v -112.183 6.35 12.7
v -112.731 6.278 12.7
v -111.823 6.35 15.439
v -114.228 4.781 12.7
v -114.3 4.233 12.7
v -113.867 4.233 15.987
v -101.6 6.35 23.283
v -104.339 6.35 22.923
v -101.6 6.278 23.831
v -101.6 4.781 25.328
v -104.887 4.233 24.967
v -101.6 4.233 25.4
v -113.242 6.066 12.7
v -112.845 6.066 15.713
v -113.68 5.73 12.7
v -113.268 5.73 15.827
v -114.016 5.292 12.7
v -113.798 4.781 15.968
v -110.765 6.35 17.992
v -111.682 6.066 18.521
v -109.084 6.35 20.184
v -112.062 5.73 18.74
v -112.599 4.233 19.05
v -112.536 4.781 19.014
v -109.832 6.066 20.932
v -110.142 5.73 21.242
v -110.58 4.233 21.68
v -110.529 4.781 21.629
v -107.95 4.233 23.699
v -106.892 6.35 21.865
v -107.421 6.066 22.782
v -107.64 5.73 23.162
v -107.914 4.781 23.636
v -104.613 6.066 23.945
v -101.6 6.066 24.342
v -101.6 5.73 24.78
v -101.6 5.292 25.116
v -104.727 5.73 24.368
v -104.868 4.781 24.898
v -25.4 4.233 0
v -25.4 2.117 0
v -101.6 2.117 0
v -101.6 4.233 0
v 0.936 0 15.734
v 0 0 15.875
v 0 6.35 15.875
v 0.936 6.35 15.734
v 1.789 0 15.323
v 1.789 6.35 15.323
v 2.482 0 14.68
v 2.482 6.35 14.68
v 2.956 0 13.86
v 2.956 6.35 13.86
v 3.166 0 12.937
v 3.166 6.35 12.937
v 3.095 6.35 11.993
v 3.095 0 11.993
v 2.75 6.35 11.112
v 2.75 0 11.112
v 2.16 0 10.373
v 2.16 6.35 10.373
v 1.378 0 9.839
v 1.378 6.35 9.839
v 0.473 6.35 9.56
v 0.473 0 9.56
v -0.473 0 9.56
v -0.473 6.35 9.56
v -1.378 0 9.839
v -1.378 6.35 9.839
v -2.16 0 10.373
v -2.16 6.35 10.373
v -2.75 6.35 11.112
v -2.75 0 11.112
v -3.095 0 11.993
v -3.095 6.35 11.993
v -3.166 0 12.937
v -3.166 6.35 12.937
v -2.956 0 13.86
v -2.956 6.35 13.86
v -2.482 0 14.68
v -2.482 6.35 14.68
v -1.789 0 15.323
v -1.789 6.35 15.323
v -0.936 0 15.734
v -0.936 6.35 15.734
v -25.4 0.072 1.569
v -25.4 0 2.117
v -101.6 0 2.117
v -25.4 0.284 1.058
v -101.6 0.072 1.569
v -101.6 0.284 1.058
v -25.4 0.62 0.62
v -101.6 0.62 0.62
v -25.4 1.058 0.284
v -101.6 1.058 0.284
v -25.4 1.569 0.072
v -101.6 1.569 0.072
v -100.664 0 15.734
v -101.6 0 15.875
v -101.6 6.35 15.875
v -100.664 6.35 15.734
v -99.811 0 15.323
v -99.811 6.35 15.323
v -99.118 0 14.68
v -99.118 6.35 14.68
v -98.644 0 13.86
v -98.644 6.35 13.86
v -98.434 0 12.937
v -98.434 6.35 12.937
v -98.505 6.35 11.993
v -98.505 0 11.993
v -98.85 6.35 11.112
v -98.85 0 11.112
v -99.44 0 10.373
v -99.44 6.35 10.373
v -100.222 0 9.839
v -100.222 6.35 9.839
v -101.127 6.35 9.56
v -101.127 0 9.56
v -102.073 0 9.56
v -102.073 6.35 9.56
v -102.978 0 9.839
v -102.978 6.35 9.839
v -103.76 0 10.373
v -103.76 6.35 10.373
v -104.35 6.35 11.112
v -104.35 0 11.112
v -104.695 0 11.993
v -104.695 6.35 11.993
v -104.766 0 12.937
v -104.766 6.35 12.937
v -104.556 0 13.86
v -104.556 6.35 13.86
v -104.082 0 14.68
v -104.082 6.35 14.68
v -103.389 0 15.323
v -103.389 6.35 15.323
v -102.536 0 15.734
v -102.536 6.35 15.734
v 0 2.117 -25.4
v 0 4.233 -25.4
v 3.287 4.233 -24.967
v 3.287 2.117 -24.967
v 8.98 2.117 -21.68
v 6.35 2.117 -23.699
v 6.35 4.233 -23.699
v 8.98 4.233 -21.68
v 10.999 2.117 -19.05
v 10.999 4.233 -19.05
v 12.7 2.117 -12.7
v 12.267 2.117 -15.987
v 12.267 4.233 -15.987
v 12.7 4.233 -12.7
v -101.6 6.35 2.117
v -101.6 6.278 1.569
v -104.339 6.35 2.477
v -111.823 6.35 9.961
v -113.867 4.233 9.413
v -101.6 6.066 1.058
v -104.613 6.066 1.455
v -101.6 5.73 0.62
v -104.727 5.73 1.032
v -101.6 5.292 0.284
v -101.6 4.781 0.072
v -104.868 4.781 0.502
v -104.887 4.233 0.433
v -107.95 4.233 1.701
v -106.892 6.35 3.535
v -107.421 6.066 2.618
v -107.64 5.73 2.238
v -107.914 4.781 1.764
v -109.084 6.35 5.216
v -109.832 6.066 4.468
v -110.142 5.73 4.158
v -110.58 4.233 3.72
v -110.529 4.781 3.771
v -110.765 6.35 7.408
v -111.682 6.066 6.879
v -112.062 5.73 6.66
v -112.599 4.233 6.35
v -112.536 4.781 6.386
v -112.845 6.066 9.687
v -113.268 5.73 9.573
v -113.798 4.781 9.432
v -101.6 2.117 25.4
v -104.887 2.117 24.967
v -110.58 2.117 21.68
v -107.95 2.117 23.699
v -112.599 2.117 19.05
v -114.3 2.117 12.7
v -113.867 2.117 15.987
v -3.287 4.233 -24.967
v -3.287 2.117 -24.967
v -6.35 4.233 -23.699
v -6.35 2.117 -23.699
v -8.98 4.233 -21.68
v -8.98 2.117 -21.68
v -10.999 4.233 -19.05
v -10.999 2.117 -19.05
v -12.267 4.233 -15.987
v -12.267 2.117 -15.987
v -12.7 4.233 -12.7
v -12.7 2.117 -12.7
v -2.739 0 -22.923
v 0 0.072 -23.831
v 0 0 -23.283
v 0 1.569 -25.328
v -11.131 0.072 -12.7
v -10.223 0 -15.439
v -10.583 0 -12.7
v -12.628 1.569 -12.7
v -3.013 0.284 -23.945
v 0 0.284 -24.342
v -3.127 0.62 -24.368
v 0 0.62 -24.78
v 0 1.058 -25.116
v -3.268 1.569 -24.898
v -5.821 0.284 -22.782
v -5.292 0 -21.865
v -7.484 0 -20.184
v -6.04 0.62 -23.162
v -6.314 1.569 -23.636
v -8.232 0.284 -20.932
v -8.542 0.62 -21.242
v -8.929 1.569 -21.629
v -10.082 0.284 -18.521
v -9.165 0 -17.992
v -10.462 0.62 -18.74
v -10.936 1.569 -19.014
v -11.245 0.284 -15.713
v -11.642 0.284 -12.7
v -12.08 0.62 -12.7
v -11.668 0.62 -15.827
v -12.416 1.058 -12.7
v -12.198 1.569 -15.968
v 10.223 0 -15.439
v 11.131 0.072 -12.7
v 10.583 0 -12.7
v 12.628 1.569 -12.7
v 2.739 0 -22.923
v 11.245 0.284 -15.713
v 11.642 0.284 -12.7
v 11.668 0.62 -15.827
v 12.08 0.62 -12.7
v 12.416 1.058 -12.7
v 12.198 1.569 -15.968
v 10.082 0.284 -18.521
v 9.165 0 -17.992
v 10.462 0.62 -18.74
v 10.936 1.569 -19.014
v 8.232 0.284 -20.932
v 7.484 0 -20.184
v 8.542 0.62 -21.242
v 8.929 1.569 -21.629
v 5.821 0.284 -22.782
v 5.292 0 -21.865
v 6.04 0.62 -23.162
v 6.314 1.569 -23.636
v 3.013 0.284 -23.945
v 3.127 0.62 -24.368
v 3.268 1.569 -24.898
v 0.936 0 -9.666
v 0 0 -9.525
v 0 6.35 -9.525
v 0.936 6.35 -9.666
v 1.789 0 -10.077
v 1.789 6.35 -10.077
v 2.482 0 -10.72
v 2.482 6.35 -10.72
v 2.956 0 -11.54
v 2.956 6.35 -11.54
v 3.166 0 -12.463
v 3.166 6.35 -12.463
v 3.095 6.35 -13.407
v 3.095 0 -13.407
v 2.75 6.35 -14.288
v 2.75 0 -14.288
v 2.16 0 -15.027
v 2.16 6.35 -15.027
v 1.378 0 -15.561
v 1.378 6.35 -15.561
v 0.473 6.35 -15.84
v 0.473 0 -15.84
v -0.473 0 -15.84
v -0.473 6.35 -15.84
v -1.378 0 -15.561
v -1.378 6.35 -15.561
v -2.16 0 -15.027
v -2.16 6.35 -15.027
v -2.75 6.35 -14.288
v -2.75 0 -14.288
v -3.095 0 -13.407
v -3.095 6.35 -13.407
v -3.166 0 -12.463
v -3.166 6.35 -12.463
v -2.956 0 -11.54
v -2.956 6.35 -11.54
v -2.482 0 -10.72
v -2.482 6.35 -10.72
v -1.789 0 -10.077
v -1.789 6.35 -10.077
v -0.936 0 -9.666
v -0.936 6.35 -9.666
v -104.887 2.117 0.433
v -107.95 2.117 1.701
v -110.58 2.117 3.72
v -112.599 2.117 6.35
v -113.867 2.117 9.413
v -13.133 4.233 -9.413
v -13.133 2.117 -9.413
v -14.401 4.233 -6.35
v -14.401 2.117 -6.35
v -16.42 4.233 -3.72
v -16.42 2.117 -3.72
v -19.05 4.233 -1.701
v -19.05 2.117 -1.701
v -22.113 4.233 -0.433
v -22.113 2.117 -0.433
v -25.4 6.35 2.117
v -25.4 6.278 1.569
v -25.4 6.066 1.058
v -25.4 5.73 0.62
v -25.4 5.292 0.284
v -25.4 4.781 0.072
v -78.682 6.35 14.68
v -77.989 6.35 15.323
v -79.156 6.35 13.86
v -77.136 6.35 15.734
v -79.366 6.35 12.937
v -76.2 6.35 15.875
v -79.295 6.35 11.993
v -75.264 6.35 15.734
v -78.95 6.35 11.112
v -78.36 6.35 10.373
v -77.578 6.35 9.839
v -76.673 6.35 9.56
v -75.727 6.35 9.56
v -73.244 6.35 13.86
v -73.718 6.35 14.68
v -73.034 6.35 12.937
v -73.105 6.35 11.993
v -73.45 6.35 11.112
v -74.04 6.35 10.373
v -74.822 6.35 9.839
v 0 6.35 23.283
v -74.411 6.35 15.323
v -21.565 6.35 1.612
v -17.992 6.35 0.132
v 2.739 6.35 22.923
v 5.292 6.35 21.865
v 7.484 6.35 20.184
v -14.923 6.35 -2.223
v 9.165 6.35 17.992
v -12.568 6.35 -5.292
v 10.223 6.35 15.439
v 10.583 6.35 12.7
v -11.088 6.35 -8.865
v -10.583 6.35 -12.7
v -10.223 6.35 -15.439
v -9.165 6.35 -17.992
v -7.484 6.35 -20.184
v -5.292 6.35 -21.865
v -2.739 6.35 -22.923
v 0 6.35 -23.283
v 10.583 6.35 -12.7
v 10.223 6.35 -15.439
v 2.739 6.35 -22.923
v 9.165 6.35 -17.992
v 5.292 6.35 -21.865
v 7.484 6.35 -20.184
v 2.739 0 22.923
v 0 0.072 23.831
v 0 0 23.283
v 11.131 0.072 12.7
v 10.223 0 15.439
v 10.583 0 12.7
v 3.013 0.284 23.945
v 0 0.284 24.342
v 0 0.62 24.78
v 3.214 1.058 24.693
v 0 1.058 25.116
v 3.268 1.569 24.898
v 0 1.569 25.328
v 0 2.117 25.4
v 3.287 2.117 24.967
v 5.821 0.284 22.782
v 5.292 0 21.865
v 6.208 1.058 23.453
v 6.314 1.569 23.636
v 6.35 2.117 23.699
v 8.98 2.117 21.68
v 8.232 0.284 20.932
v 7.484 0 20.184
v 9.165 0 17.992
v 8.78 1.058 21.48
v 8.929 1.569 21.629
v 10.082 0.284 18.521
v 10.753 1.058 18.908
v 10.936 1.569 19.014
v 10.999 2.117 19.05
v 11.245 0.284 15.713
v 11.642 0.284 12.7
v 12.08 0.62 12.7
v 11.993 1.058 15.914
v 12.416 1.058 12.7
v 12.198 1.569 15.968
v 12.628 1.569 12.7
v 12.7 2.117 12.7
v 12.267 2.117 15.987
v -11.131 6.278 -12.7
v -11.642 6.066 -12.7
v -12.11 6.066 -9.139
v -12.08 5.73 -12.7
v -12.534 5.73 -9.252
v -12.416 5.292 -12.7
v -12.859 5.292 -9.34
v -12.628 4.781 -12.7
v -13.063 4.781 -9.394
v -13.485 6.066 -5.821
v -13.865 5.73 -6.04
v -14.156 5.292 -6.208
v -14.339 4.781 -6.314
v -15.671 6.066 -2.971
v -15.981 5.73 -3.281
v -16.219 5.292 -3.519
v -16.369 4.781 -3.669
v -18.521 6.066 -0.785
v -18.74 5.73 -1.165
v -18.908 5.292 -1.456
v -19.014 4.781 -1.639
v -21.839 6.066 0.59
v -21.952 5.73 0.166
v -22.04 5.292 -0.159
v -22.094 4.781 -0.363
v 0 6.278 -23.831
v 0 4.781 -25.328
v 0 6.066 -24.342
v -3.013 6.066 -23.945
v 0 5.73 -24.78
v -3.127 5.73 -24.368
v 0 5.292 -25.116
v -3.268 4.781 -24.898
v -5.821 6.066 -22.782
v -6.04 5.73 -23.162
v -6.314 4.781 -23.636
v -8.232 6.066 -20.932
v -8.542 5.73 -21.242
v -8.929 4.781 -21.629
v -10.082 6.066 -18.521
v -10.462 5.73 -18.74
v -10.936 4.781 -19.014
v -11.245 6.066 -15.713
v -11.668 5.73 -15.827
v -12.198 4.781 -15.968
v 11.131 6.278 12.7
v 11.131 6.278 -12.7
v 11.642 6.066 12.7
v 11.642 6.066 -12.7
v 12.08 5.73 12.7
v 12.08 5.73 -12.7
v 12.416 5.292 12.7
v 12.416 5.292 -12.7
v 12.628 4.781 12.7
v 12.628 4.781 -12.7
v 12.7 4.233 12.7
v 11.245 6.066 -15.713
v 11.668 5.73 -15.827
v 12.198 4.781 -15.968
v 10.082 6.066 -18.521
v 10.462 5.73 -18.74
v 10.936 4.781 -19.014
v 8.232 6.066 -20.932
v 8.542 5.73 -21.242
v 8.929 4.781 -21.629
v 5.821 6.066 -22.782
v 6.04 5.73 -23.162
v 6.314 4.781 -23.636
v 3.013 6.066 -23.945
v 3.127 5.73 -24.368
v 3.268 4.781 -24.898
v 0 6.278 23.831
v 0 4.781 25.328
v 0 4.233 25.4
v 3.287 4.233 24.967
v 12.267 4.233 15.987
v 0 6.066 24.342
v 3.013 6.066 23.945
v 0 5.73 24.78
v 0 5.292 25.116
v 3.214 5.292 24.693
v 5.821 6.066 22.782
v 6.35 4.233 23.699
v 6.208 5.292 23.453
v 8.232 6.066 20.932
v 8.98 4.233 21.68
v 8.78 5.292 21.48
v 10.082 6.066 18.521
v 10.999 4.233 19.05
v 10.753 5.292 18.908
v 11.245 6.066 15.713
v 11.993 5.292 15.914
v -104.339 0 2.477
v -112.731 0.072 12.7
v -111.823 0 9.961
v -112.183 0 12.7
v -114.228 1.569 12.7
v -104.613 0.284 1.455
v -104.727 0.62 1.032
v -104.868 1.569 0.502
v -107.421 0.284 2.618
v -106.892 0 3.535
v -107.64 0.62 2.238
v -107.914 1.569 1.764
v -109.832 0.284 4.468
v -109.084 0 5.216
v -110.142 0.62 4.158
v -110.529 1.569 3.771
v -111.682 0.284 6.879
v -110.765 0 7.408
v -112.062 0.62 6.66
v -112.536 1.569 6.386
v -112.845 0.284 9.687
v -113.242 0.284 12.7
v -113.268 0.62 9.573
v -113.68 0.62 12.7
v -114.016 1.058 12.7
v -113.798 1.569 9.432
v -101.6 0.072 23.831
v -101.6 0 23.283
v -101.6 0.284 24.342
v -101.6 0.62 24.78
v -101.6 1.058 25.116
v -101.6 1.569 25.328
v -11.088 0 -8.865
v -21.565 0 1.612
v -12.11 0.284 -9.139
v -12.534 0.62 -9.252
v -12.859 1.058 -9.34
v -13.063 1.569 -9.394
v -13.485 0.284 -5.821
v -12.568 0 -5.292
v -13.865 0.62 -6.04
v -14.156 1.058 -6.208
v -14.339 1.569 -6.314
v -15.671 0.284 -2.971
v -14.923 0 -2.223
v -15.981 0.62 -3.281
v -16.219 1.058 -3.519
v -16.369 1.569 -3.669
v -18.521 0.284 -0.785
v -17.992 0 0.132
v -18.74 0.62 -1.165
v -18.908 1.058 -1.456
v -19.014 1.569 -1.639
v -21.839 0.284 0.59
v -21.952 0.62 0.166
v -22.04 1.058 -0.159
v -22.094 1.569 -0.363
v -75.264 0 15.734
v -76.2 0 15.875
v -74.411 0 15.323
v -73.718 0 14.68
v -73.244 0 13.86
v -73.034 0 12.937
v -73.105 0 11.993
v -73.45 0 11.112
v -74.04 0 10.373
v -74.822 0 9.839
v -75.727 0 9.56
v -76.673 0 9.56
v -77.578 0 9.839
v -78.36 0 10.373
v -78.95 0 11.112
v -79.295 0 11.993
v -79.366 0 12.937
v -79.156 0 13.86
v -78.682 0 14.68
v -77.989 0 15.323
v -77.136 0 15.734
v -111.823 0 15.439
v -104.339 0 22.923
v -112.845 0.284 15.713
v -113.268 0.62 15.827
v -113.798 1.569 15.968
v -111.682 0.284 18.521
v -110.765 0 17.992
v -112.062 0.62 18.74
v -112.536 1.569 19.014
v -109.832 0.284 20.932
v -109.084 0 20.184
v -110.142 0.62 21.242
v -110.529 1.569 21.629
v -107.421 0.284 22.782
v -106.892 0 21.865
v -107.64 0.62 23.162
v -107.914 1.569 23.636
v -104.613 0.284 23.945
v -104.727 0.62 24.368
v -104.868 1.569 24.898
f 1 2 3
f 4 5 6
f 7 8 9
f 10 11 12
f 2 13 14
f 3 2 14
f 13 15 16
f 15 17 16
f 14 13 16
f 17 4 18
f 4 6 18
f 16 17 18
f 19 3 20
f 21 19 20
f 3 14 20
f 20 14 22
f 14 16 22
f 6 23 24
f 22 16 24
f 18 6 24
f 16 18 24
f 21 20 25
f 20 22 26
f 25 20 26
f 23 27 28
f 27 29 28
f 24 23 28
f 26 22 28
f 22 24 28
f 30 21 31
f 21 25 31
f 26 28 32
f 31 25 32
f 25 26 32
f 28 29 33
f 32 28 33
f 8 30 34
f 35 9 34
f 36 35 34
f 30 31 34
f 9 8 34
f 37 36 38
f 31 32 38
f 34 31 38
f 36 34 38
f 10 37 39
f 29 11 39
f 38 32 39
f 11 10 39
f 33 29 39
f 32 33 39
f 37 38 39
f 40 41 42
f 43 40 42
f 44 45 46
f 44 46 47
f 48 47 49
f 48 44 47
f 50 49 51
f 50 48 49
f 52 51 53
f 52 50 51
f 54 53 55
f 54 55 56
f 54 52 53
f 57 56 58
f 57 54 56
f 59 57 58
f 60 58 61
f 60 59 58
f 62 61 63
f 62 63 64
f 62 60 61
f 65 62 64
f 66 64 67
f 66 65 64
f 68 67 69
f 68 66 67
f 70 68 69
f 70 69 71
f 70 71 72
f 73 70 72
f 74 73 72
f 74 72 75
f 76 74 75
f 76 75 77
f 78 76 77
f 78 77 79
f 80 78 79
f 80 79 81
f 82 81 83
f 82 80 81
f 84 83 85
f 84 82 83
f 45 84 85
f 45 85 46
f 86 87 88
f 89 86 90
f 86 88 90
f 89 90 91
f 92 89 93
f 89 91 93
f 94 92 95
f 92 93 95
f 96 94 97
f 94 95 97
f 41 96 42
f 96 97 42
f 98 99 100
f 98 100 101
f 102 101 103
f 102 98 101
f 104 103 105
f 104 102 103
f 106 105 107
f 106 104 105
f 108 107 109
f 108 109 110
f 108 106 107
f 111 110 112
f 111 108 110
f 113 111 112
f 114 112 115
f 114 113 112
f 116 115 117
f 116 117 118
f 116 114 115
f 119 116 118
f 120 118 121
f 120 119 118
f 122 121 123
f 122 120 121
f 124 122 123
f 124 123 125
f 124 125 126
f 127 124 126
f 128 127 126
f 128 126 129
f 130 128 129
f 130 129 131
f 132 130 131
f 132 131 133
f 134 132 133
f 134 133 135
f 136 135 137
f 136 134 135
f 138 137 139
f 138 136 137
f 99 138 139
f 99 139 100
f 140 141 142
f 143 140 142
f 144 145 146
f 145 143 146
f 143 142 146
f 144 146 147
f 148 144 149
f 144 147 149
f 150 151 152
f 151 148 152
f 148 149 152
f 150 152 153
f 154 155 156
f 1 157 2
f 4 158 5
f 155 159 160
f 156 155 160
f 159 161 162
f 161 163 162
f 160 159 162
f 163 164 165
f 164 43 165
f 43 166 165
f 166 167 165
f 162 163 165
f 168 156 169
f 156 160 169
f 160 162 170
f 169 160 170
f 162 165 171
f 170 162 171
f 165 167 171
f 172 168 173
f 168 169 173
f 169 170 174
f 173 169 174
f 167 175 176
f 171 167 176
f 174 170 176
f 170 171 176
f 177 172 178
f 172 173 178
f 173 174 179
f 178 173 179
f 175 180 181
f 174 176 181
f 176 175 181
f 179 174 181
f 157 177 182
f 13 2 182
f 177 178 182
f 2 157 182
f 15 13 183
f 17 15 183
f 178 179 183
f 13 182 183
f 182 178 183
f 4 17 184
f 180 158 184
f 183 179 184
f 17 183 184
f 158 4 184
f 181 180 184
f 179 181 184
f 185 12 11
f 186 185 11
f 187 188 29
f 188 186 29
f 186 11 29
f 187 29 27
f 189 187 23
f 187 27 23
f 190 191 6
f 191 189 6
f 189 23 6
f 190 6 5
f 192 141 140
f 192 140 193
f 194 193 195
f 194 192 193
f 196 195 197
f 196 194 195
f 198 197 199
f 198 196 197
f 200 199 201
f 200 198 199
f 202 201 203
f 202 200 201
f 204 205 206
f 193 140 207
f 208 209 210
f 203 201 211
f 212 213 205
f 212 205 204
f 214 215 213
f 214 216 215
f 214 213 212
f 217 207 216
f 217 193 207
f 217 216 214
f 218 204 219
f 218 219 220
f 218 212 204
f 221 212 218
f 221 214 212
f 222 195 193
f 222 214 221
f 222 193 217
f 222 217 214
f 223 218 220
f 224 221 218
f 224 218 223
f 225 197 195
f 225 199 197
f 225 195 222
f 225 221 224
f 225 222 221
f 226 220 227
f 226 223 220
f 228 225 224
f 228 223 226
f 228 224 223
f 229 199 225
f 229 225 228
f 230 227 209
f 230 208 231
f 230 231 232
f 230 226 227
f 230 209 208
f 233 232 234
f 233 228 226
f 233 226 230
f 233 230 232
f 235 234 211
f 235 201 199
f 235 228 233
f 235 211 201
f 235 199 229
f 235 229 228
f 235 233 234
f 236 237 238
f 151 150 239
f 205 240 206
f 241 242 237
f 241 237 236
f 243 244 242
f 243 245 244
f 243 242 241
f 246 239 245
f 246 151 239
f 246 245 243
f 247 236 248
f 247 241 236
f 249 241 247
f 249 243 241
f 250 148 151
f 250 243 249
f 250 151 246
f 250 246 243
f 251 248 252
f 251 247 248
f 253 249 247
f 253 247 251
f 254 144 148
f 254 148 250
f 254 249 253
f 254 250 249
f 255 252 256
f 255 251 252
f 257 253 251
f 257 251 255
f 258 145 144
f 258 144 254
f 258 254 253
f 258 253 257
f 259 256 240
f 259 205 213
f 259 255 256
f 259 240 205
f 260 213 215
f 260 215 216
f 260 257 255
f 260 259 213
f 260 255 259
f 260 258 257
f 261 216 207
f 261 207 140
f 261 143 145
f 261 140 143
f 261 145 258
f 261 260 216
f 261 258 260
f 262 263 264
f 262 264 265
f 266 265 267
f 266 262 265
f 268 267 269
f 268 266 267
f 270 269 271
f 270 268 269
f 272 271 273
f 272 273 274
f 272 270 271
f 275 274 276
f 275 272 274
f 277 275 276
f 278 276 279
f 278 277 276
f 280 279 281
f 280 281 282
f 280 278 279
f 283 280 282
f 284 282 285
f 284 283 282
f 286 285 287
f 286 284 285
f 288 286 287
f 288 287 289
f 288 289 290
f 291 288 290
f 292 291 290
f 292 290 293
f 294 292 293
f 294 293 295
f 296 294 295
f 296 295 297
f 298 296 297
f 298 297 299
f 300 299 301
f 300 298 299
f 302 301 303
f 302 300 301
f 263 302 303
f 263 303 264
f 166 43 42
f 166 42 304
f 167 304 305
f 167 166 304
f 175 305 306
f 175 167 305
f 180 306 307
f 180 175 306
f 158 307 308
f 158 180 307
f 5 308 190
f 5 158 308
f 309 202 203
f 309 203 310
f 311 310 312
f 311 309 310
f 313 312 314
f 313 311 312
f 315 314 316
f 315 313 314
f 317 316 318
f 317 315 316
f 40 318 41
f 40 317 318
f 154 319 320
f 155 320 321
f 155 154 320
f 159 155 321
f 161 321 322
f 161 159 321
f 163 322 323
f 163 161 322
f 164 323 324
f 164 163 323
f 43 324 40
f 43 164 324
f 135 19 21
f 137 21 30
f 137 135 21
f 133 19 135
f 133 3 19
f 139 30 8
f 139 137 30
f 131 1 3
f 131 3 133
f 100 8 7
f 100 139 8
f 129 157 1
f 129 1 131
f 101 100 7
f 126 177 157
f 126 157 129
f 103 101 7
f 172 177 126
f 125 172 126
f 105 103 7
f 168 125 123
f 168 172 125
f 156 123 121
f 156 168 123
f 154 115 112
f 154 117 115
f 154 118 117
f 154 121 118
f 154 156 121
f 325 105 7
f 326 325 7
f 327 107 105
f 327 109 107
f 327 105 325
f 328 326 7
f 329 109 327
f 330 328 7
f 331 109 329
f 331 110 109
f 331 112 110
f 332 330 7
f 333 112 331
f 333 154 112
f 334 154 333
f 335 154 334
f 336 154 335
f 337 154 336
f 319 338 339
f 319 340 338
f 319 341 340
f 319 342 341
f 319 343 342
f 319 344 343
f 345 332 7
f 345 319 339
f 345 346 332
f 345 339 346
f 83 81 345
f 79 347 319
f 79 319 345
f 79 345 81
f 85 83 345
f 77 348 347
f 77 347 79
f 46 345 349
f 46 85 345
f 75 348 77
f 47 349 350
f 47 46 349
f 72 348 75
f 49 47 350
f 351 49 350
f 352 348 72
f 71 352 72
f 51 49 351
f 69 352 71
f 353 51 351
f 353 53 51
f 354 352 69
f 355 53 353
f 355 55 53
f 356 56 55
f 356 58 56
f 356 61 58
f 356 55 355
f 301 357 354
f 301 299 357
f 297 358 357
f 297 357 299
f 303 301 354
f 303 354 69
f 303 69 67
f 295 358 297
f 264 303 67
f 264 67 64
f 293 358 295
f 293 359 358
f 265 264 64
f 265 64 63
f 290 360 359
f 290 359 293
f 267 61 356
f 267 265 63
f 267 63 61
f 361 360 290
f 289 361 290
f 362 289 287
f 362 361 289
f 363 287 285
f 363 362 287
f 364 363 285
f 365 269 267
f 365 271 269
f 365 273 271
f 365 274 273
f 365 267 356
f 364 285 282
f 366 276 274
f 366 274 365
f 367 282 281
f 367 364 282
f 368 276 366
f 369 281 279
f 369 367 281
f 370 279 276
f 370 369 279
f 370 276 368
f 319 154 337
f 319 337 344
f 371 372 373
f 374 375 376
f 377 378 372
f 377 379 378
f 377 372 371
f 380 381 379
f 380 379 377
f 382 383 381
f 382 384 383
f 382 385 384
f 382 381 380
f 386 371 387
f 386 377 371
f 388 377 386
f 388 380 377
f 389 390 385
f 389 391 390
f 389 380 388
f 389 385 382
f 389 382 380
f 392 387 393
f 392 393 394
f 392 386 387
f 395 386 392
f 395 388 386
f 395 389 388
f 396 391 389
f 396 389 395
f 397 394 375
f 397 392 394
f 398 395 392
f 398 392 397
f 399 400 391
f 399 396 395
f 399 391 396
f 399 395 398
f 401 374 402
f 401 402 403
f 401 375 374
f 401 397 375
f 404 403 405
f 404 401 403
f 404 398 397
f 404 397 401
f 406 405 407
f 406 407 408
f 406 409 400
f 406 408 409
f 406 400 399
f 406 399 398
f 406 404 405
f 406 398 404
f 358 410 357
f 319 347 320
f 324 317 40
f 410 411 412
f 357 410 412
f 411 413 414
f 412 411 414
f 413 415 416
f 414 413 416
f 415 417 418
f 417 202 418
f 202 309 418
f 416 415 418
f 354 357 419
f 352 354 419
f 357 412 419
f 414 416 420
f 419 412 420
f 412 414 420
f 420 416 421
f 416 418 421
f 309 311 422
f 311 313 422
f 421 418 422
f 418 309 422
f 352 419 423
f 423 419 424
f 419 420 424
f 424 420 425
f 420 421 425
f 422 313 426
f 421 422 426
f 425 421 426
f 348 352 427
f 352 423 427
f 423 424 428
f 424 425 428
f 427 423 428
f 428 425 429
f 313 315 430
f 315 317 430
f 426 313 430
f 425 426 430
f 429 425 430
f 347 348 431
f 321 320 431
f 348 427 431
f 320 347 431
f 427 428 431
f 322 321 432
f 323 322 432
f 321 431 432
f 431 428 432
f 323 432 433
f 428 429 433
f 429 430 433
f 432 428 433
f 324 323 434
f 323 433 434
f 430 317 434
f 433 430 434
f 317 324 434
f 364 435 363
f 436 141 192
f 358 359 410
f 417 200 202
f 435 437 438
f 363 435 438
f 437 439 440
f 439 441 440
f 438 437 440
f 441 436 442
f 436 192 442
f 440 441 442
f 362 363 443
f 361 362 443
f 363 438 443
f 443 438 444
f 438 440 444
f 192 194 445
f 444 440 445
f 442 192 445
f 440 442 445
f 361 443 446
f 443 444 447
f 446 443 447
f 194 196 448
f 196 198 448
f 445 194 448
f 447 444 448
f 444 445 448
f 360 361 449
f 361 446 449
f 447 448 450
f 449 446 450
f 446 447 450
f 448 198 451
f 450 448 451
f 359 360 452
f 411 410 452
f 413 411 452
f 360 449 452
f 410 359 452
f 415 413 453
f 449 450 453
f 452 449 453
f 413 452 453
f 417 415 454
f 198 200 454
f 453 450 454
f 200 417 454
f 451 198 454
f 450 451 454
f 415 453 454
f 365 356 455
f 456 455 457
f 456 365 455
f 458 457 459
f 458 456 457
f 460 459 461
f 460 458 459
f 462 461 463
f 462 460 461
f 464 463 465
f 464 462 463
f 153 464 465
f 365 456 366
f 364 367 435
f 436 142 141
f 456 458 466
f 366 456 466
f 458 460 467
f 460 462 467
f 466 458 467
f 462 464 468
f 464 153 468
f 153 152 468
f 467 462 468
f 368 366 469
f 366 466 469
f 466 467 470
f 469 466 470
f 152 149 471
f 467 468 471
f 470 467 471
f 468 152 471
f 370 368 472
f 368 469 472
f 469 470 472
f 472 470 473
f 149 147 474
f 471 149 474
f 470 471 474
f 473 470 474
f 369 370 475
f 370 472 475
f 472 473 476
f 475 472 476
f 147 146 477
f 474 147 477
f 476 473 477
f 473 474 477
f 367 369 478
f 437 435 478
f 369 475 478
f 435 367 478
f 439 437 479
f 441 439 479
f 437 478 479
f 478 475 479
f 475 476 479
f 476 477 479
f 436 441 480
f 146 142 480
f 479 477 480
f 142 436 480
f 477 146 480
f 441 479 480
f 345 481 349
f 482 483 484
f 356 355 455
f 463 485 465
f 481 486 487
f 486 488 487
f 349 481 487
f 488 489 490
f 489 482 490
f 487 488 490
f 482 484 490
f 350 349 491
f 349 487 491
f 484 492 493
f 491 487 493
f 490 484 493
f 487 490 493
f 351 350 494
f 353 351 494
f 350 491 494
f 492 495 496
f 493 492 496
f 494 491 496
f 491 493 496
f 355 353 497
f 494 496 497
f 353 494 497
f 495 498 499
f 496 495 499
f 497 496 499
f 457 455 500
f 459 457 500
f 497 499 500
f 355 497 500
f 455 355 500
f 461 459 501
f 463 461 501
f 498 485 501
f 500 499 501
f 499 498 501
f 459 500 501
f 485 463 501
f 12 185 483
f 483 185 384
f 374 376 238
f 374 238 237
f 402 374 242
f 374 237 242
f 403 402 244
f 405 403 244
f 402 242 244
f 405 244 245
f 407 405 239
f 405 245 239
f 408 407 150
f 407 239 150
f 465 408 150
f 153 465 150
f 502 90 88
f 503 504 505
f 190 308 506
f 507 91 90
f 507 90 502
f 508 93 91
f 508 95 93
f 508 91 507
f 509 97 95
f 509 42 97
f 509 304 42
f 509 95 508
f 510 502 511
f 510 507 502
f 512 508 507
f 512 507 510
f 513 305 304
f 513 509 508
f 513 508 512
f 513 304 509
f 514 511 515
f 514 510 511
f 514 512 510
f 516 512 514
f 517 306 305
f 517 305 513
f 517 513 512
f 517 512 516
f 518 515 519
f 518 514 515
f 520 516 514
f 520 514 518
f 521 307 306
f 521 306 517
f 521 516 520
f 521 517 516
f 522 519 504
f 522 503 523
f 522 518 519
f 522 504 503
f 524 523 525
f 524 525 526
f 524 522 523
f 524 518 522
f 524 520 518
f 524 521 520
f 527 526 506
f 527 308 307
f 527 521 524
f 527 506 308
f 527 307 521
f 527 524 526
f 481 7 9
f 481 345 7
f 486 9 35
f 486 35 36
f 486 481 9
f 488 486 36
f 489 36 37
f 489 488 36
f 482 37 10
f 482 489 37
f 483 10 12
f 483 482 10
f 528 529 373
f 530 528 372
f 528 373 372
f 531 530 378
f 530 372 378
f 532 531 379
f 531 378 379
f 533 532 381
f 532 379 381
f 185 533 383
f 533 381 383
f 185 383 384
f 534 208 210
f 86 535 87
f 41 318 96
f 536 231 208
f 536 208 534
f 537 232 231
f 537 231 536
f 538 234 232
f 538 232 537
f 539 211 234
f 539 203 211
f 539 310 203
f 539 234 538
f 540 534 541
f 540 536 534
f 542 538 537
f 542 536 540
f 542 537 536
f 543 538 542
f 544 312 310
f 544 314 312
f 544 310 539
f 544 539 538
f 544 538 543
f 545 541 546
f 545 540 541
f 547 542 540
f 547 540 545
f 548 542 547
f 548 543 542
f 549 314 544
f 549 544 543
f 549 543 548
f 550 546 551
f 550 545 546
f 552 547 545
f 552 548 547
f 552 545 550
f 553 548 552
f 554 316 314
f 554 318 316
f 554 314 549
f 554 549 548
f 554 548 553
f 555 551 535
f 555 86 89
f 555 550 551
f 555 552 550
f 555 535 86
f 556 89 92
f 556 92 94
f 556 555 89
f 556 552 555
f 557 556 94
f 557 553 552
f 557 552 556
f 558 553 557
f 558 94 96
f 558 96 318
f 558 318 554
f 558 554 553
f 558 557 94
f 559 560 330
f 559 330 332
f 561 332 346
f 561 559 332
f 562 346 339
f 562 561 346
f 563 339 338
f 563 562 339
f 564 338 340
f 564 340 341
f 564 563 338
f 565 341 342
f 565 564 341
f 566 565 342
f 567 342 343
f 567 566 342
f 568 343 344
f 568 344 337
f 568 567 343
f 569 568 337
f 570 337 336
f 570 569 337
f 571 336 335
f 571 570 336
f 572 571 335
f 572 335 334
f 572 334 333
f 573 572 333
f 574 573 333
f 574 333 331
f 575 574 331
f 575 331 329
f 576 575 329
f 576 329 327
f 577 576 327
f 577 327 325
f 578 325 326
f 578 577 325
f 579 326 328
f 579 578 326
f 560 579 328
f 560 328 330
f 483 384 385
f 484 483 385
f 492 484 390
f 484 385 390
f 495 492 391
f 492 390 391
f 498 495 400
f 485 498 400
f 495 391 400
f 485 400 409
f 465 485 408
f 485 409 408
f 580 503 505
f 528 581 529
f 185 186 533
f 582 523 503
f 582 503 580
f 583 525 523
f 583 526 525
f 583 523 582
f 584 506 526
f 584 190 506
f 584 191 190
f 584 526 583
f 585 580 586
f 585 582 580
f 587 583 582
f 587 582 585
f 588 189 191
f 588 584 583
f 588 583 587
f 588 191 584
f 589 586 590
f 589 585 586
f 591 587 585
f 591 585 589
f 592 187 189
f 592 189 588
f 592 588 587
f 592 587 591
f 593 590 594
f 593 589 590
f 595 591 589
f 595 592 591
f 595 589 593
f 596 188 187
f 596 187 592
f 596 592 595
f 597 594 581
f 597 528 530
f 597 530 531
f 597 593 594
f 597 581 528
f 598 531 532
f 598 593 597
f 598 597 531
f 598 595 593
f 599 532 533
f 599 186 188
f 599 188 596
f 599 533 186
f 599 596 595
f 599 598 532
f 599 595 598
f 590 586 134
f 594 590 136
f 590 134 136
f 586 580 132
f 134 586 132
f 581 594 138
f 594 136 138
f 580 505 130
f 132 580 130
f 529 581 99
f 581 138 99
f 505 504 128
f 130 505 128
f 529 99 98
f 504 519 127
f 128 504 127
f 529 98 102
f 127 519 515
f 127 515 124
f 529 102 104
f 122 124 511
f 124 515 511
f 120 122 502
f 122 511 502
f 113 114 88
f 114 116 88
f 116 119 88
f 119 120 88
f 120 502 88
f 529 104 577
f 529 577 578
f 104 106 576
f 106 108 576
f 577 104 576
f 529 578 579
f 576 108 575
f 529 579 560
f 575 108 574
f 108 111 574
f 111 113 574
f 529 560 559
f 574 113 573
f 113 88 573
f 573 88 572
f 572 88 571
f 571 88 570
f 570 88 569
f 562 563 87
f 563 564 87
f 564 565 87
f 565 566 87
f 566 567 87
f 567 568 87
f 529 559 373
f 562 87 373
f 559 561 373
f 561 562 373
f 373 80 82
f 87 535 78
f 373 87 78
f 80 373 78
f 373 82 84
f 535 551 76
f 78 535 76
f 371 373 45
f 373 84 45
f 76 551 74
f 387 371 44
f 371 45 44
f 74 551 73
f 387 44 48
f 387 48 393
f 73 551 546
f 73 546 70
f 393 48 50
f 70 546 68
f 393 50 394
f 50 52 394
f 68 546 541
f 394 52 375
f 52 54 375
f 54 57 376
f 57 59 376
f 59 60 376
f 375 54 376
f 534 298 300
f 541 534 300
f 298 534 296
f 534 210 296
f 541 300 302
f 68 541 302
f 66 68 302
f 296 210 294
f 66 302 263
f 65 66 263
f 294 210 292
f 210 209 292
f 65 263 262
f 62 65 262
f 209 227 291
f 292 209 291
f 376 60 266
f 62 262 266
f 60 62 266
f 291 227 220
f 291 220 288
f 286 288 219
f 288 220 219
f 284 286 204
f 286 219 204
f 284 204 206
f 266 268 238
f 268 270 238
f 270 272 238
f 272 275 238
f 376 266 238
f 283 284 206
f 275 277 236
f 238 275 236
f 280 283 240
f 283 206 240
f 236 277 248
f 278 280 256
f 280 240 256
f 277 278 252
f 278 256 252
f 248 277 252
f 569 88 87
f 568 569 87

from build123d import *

# Parameters (mm, degrees)
SKETCH1_R           = 3.175
BOSS_EXTRUDE1_DEPTH = 6.35
FILLET2_R           = 12.7
FILLET3_R           = 2.116666667


with BuildPart() as part:
    # Sketch1 → Boss-Extrude1 (new body)
    with BuildSketch(Plane(origin=(0, 0, 0), x_dir=(1, 0, 0), z_dir=(0, 1, 0))):
        with BuildLine():
            Line((12.7, 25.4), (-12.7, 25.4))
            Line((-12.7, 25.4), (-12.7, 0))
            Line((-12.7, 0), (-114.3, 0))
            Line((-114.3, 0), (-114.3, -25.4))
            Line((-114.3, -25.4), (0, -25.4))
            ThreePointArc((0, -25.4), (8.980256121, -21.680256121), (12.7, -12.7))
            Line((12.7, -12.7), (12.7, 25.4))
        make_face()
        with Locations(Location((-76.2, -12.7, 0), (0, 0, 270))):
            Circle(SKETCH1_R, mode=Mode.SUBTRACT)
        with Locations(Location((-101.6, -12.7, 0), (0, 0, 270))):
            Circle(SKETCH1_R, mode=Mode.SUBTRACT)
        with Locations(Location((0, -12.7, 0), (0, 0, 270))):
            Circle(SKETCH1_R, mode=Mode.SUBTRACT)
        with Locations(Location((0, 12.7, 0), (0, 0, 270))):
            Circle(SKETCH1_R, mode=Mode.SUBTRACT)
    extrude(amount=BOSS_EXTRUDE1_DEPTH)

    # Fillet2
    fillet2_edges = [part.edges().sort_by_distance(p)[0] for p in [
        (12.7, 3.175, -25.4),
        (-12.7, 3.175, -25.4),
        (-114.3, 3.175, 0),
        (-114.3, 3.175, 25.4),
        (-12.7, 3.175, 0),
    ]]
    fillet(fillet2_edges, radius=FILLET2_R - 0.0001)  # a hair under: the kernel refuses the full size

    # Fillet3
    fillet3_edges = [part.edges().sort_by_distance(p)[0] for p in [
        (8.980256121, 6.35, 21.680256121),
        (12.7, 0, -5e-05),
        (12.7, 6.35, -5e-05),
        (8.980256121, 0, 21.680256121),
        (-63.5, 0, 0),
        (-63.5, 6.35, 0),
        (-50.80005, 0, 25.4),
        (-110.58028541, 0, 21.68028541),
        (-110.58028541, 0, 3.71971459),
        (-8.98028541, 0, -21.68028541),
        (8.98028541, 0, -21.68028541),
        (-50.80005, 6.35, 25.4),
        (-110.58028541, 6.35, 21.68028541),
        (-110.58028541, 6.35, 3.71971459),
        (-8.98028541, 6.35, -21.68028541),
        (8.98028541, 6.35, -21.68028541),
        (-16.41971459, 0, -3.71971459),
        (-16.41971459, 6.35, -3.71971459),
    ]]
    fillet(fillet3_edges, radius=FILLET3_R)


solid = part.part
